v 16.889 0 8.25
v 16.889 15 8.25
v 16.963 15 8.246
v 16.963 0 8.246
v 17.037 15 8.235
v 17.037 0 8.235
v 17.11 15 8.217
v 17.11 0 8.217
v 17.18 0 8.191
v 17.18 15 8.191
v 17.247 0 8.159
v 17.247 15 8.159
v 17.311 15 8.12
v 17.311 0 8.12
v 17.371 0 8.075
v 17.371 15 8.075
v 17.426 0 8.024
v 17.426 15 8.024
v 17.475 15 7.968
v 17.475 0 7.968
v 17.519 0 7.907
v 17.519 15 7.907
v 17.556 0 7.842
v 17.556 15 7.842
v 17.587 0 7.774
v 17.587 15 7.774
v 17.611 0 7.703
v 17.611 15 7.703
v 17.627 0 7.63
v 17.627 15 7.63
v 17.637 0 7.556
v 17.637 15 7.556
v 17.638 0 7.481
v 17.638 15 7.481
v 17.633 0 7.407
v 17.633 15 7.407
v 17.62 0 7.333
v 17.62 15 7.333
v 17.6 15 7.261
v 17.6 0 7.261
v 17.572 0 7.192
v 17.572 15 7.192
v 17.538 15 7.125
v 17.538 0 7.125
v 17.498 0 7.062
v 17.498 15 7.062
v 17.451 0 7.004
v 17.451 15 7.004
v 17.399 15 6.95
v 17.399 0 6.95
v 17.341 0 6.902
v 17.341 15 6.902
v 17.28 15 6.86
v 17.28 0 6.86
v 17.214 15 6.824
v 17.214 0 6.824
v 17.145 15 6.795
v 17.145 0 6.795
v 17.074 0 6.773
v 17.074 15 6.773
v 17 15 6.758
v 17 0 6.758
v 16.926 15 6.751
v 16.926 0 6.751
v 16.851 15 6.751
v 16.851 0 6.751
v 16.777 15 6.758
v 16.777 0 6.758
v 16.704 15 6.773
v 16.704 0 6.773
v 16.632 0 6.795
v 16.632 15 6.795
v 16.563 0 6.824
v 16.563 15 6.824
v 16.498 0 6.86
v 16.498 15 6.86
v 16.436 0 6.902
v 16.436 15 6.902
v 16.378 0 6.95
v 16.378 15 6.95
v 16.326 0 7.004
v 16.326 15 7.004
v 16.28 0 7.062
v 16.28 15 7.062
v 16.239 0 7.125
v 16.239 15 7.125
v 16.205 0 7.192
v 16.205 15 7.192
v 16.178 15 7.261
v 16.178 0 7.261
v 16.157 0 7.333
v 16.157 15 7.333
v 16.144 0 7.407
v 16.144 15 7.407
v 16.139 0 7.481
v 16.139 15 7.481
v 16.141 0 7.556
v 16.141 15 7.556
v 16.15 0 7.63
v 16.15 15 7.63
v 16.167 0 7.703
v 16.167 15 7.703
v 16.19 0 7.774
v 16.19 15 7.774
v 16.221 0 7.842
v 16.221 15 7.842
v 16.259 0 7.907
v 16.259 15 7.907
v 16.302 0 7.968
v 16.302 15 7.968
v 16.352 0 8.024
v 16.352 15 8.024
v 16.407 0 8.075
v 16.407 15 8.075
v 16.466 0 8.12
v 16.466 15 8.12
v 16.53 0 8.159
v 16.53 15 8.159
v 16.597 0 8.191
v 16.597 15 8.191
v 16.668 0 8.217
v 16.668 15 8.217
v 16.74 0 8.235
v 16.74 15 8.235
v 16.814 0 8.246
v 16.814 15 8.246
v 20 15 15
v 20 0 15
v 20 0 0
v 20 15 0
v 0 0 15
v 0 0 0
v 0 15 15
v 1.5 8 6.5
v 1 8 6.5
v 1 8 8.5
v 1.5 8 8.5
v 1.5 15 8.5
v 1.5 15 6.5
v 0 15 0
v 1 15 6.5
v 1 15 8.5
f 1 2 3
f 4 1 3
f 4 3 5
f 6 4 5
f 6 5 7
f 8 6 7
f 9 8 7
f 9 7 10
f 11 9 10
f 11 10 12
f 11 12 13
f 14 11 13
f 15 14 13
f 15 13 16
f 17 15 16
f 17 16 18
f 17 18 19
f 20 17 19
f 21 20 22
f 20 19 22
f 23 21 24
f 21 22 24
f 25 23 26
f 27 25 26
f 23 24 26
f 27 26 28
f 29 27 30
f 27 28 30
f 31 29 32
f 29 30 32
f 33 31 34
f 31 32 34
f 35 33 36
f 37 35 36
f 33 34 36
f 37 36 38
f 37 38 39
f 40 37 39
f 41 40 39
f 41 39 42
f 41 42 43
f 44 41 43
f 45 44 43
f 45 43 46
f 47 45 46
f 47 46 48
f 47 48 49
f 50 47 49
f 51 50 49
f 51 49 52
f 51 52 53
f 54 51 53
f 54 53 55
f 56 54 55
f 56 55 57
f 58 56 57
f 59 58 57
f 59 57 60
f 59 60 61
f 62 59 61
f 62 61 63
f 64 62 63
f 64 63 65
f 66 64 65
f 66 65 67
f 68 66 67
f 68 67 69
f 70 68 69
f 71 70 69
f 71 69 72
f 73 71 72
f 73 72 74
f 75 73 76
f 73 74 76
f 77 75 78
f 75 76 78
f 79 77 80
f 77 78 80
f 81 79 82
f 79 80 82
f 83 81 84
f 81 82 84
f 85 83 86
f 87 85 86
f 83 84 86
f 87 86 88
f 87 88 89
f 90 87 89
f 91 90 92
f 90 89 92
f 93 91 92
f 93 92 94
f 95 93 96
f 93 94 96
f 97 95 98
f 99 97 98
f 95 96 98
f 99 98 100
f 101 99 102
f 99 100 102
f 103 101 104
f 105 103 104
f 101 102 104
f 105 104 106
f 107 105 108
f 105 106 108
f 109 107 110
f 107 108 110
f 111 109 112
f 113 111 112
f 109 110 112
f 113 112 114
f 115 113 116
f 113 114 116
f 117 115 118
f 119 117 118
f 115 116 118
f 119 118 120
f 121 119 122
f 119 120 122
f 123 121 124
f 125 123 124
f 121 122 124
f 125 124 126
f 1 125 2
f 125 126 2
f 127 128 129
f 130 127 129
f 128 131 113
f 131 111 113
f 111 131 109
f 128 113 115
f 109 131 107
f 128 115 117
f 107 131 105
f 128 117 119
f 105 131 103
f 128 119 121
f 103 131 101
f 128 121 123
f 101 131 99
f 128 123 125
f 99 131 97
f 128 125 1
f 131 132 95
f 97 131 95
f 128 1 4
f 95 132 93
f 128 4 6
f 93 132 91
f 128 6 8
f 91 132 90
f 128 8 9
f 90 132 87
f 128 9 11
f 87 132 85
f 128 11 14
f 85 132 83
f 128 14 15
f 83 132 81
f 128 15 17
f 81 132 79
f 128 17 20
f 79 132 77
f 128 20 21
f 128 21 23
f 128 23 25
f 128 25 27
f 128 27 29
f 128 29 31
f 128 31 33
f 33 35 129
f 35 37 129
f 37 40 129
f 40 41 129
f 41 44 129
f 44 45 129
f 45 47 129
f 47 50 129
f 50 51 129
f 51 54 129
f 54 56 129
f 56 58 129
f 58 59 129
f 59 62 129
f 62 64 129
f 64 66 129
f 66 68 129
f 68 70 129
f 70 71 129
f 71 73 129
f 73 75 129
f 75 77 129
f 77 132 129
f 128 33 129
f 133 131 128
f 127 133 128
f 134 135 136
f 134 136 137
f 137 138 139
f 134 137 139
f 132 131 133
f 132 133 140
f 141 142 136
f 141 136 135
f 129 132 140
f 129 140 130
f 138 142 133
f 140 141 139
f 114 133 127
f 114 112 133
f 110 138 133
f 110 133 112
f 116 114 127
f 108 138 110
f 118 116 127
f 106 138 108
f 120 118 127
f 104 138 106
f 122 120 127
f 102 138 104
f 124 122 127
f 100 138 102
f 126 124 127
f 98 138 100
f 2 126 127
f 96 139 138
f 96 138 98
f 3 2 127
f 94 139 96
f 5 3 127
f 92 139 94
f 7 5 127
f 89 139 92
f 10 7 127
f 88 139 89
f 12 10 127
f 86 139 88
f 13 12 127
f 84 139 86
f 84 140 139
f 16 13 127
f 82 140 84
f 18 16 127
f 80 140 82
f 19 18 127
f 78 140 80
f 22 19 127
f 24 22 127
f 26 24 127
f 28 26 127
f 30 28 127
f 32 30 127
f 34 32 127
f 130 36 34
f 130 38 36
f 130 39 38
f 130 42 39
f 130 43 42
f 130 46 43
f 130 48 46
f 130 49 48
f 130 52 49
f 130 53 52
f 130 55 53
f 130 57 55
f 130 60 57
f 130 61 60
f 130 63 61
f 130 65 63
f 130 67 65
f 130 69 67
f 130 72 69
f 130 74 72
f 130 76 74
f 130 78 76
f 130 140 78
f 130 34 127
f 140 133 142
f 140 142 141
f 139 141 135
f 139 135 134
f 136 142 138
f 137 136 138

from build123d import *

# Parameters (mm, degrees)
CROQUIS1_W              = 20
CROQUIS1_H              = 15
SALIENTE_EXTRUIR1_DEPTH = 15
CROQUIS2_R              = 0.75
CORTAR_EXTRUIR1_DEPTH   = 16
CROQUIS2_3_W            = 0.5
CROQUIS2_3_H            = 2
CORTAR_EXTRUIR2_DEPTH   = 7


with BuildPart() as part:
    # Croquis1 → Saliente-Extruir1 (new body)
    with BuildSketch(Plane(origin=(0, 0, 0), x_dir=(1, 0, 0), z_dir=(0, 1, 0))):
        with Locations((10, -7.5)):
            Rectangle(CROQUIS1_W, CROQUIS1_H)
    extrude(amount=SALIENTE_EXTRUIR1_DEPTH)

    # Croquis2 → Cortar-Extruir1 (cut, through all)
    with BuildSketch(Plane(origin=(0, 15, 0), x_dir=(1, 0, 0), z_dir=(0, 1, 0))):
        with Locations(Location((16.888623538, -7.5, 0), (0, 0, 270))):  # turned: the seam where the file's is
            Circle(CROQUIS2_R)
    extrude(amount=-CORTAR_EXTRUIR1_DEPTH, mode=Mode.SUBTRACT)

    # Croquis2_3 → Cortar-Extruir2 (cut)
    with BuildSketch(Plane(origin=(0, 15, 0), x_dir=(1, 0, 0), z_dir=(0, 1, 0))):
        with Locations((1.25, -7.5)):
            Rectangle(CROQUIS2_3_W, CROQUIS2_3_H)
    extrude(amount=-CORTAR_EXTRUIR2_DEPTH, mode=Mode.SUBTRACT)


solid = part.part
